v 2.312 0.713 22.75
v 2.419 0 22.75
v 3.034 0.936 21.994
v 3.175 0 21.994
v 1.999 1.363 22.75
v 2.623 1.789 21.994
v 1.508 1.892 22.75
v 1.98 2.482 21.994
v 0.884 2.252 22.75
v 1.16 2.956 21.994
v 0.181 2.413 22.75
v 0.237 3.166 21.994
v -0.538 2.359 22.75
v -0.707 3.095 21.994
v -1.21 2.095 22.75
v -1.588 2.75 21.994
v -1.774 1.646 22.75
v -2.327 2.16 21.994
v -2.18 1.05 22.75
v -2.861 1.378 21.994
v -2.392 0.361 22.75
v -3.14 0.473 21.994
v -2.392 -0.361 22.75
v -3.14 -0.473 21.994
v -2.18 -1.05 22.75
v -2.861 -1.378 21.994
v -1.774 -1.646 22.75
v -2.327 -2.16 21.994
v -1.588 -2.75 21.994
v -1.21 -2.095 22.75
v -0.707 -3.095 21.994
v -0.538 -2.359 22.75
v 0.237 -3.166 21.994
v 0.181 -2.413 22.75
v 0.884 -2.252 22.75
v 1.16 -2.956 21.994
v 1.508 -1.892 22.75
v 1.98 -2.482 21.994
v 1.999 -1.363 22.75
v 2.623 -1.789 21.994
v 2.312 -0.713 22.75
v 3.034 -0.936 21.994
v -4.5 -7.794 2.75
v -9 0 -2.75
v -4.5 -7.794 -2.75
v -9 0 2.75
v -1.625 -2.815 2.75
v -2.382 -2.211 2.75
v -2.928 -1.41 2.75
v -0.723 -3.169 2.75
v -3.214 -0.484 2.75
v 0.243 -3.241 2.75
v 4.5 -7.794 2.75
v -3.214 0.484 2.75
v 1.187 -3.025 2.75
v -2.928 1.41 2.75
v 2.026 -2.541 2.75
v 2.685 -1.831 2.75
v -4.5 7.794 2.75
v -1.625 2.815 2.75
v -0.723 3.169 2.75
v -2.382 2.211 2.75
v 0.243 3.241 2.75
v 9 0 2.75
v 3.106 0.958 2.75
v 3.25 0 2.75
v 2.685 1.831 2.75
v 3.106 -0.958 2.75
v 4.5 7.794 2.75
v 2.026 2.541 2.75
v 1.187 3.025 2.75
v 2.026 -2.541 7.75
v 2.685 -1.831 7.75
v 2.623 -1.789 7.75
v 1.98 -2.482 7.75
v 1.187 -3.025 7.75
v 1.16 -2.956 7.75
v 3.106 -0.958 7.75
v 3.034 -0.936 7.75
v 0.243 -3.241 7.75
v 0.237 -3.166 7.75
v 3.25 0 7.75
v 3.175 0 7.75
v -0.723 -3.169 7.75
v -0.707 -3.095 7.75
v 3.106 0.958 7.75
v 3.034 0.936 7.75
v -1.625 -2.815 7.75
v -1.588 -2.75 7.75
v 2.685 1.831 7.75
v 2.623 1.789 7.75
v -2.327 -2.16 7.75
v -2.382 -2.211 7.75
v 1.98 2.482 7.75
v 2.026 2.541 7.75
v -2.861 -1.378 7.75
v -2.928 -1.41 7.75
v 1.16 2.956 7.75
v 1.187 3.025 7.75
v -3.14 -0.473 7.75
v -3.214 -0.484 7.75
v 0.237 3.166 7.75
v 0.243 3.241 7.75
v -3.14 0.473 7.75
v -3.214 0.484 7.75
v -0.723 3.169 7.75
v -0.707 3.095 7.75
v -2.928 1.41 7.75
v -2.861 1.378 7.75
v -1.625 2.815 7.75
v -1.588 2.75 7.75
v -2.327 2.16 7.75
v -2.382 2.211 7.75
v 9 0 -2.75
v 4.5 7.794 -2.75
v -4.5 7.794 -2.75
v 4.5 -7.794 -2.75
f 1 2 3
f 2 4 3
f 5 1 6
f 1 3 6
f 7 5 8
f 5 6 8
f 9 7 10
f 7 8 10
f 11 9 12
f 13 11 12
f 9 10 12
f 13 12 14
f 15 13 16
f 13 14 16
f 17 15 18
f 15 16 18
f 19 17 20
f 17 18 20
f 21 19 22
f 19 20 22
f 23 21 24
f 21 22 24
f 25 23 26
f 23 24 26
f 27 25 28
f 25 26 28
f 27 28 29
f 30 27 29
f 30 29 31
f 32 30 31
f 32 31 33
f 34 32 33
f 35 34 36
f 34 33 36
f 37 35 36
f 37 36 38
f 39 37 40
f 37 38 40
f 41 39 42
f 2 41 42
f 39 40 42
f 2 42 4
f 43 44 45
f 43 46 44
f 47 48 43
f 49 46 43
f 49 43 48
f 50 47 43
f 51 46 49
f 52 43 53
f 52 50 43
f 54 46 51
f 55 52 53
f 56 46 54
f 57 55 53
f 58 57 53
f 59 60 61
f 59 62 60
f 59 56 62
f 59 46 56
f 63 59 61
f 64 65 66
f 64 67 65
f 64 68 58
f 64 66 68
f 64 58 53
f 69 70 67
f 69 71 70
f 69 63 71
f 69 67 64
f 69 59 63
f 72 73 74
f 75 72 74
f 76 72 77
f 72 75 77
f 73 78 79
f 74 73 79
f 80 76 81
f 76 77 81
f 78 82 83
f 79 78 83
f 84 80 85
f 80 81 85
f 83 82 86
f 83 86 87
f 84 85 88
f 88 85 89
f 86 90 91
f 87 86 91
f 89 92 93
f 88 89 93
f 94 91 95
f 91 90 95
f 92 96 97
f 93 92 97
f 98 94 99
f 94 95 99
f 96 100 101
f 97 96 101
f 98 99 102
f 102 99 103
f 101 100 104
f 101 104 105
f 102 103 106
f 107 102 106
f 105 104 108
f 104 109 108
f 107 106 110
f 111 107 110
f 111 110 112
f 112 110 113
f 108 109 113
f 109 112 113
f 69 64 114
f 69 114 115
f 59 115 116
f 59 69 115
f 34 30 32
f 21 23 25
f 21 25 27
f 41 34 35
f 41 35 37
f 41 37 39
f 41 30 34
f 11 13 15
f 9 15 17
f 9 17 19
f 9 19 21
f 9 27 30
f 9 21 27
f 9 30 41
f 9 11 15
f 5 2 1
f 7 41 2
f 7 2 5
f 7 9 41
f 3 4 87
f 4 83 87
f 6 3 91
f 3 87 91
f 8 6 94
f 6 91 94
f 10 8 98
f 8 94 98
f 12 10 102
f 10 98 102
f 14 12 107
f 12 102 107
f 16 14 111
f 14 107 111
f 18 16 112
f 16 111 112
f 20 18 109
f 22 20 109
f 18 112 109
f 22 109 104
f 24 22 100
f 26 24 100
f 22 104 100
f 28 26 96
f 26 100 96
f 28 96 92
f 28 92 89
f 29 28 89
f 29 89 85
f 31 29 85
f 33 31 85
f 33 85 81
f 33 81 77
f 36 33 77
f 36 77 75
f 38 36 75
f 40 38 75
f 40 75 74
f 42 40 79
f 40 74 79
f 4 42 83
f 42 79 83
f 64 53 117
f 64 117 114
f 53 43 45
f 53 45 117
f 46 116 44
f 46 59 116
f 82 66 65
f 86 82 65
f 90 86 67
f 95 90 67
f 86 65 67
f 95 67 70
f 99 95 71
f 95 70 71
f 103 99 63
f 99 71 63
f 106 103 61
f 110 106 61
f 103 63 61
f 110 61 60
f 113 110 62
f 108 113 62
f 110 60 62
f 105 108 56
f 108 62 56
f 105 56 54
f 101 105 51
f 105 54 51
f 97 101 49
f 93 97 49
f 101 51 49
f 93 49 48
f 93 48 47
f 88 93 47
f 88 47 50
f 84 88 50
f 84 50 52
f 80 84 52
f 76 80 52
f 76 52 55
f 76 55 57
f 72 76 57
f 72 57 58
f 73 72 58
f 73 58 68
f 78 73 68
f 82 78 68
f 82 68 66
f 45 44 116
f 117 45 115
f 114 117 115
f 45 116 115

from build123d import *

# Parameters (mm, degrees)
BOSS_EXTRUDE1_DEPTH = 2.75
SKETCH2_R           = 3.25
BOSS_EXTRUDE2_DEPTH = 20


# Read off the part's stored shape, not the designer's step: 1/4-20 Machine Threads Stud1
with BuildPart() as part:
    # Sketch1 → Boss-Extrude1 (new, symmetric)
    with BuildSketch(Plane.XY):
        Polygon((-9, 0), (-4.5, -7.794228634), (4.5, -7.794228634), (9, 0), (4.5, 7.794228634), (-4.5, 7.794228634), align=None)
    extrude(amount=BOSS_EXTRUDE1_DEPTH, both=True)

    # Sketch2 → Boss-Extrude2 (add)
    with BuildSketch(Plane.XY.offset(2.75)):
        Circle(SKETCH2_R)
    extrude(amount=BOSS_EXTRUDE2_DEPTH)

    # 1/4-20 Machine Threads Stud1 outline → 1/4-20 Machine Threads Stud1 (revolve, cut)
    with BuildSketch(Plane.XZ):
        Polygon((3.25, 22.75), (2.41935, 22.75), (3.175, 21.99435), (3.175, 7.75), (3.25, 7.75), align=None)
    revolve(axis=Axis((0, 0, 0), (0, 0, 1)), mode=Mode.SUBTRACT)


solid = part.part
